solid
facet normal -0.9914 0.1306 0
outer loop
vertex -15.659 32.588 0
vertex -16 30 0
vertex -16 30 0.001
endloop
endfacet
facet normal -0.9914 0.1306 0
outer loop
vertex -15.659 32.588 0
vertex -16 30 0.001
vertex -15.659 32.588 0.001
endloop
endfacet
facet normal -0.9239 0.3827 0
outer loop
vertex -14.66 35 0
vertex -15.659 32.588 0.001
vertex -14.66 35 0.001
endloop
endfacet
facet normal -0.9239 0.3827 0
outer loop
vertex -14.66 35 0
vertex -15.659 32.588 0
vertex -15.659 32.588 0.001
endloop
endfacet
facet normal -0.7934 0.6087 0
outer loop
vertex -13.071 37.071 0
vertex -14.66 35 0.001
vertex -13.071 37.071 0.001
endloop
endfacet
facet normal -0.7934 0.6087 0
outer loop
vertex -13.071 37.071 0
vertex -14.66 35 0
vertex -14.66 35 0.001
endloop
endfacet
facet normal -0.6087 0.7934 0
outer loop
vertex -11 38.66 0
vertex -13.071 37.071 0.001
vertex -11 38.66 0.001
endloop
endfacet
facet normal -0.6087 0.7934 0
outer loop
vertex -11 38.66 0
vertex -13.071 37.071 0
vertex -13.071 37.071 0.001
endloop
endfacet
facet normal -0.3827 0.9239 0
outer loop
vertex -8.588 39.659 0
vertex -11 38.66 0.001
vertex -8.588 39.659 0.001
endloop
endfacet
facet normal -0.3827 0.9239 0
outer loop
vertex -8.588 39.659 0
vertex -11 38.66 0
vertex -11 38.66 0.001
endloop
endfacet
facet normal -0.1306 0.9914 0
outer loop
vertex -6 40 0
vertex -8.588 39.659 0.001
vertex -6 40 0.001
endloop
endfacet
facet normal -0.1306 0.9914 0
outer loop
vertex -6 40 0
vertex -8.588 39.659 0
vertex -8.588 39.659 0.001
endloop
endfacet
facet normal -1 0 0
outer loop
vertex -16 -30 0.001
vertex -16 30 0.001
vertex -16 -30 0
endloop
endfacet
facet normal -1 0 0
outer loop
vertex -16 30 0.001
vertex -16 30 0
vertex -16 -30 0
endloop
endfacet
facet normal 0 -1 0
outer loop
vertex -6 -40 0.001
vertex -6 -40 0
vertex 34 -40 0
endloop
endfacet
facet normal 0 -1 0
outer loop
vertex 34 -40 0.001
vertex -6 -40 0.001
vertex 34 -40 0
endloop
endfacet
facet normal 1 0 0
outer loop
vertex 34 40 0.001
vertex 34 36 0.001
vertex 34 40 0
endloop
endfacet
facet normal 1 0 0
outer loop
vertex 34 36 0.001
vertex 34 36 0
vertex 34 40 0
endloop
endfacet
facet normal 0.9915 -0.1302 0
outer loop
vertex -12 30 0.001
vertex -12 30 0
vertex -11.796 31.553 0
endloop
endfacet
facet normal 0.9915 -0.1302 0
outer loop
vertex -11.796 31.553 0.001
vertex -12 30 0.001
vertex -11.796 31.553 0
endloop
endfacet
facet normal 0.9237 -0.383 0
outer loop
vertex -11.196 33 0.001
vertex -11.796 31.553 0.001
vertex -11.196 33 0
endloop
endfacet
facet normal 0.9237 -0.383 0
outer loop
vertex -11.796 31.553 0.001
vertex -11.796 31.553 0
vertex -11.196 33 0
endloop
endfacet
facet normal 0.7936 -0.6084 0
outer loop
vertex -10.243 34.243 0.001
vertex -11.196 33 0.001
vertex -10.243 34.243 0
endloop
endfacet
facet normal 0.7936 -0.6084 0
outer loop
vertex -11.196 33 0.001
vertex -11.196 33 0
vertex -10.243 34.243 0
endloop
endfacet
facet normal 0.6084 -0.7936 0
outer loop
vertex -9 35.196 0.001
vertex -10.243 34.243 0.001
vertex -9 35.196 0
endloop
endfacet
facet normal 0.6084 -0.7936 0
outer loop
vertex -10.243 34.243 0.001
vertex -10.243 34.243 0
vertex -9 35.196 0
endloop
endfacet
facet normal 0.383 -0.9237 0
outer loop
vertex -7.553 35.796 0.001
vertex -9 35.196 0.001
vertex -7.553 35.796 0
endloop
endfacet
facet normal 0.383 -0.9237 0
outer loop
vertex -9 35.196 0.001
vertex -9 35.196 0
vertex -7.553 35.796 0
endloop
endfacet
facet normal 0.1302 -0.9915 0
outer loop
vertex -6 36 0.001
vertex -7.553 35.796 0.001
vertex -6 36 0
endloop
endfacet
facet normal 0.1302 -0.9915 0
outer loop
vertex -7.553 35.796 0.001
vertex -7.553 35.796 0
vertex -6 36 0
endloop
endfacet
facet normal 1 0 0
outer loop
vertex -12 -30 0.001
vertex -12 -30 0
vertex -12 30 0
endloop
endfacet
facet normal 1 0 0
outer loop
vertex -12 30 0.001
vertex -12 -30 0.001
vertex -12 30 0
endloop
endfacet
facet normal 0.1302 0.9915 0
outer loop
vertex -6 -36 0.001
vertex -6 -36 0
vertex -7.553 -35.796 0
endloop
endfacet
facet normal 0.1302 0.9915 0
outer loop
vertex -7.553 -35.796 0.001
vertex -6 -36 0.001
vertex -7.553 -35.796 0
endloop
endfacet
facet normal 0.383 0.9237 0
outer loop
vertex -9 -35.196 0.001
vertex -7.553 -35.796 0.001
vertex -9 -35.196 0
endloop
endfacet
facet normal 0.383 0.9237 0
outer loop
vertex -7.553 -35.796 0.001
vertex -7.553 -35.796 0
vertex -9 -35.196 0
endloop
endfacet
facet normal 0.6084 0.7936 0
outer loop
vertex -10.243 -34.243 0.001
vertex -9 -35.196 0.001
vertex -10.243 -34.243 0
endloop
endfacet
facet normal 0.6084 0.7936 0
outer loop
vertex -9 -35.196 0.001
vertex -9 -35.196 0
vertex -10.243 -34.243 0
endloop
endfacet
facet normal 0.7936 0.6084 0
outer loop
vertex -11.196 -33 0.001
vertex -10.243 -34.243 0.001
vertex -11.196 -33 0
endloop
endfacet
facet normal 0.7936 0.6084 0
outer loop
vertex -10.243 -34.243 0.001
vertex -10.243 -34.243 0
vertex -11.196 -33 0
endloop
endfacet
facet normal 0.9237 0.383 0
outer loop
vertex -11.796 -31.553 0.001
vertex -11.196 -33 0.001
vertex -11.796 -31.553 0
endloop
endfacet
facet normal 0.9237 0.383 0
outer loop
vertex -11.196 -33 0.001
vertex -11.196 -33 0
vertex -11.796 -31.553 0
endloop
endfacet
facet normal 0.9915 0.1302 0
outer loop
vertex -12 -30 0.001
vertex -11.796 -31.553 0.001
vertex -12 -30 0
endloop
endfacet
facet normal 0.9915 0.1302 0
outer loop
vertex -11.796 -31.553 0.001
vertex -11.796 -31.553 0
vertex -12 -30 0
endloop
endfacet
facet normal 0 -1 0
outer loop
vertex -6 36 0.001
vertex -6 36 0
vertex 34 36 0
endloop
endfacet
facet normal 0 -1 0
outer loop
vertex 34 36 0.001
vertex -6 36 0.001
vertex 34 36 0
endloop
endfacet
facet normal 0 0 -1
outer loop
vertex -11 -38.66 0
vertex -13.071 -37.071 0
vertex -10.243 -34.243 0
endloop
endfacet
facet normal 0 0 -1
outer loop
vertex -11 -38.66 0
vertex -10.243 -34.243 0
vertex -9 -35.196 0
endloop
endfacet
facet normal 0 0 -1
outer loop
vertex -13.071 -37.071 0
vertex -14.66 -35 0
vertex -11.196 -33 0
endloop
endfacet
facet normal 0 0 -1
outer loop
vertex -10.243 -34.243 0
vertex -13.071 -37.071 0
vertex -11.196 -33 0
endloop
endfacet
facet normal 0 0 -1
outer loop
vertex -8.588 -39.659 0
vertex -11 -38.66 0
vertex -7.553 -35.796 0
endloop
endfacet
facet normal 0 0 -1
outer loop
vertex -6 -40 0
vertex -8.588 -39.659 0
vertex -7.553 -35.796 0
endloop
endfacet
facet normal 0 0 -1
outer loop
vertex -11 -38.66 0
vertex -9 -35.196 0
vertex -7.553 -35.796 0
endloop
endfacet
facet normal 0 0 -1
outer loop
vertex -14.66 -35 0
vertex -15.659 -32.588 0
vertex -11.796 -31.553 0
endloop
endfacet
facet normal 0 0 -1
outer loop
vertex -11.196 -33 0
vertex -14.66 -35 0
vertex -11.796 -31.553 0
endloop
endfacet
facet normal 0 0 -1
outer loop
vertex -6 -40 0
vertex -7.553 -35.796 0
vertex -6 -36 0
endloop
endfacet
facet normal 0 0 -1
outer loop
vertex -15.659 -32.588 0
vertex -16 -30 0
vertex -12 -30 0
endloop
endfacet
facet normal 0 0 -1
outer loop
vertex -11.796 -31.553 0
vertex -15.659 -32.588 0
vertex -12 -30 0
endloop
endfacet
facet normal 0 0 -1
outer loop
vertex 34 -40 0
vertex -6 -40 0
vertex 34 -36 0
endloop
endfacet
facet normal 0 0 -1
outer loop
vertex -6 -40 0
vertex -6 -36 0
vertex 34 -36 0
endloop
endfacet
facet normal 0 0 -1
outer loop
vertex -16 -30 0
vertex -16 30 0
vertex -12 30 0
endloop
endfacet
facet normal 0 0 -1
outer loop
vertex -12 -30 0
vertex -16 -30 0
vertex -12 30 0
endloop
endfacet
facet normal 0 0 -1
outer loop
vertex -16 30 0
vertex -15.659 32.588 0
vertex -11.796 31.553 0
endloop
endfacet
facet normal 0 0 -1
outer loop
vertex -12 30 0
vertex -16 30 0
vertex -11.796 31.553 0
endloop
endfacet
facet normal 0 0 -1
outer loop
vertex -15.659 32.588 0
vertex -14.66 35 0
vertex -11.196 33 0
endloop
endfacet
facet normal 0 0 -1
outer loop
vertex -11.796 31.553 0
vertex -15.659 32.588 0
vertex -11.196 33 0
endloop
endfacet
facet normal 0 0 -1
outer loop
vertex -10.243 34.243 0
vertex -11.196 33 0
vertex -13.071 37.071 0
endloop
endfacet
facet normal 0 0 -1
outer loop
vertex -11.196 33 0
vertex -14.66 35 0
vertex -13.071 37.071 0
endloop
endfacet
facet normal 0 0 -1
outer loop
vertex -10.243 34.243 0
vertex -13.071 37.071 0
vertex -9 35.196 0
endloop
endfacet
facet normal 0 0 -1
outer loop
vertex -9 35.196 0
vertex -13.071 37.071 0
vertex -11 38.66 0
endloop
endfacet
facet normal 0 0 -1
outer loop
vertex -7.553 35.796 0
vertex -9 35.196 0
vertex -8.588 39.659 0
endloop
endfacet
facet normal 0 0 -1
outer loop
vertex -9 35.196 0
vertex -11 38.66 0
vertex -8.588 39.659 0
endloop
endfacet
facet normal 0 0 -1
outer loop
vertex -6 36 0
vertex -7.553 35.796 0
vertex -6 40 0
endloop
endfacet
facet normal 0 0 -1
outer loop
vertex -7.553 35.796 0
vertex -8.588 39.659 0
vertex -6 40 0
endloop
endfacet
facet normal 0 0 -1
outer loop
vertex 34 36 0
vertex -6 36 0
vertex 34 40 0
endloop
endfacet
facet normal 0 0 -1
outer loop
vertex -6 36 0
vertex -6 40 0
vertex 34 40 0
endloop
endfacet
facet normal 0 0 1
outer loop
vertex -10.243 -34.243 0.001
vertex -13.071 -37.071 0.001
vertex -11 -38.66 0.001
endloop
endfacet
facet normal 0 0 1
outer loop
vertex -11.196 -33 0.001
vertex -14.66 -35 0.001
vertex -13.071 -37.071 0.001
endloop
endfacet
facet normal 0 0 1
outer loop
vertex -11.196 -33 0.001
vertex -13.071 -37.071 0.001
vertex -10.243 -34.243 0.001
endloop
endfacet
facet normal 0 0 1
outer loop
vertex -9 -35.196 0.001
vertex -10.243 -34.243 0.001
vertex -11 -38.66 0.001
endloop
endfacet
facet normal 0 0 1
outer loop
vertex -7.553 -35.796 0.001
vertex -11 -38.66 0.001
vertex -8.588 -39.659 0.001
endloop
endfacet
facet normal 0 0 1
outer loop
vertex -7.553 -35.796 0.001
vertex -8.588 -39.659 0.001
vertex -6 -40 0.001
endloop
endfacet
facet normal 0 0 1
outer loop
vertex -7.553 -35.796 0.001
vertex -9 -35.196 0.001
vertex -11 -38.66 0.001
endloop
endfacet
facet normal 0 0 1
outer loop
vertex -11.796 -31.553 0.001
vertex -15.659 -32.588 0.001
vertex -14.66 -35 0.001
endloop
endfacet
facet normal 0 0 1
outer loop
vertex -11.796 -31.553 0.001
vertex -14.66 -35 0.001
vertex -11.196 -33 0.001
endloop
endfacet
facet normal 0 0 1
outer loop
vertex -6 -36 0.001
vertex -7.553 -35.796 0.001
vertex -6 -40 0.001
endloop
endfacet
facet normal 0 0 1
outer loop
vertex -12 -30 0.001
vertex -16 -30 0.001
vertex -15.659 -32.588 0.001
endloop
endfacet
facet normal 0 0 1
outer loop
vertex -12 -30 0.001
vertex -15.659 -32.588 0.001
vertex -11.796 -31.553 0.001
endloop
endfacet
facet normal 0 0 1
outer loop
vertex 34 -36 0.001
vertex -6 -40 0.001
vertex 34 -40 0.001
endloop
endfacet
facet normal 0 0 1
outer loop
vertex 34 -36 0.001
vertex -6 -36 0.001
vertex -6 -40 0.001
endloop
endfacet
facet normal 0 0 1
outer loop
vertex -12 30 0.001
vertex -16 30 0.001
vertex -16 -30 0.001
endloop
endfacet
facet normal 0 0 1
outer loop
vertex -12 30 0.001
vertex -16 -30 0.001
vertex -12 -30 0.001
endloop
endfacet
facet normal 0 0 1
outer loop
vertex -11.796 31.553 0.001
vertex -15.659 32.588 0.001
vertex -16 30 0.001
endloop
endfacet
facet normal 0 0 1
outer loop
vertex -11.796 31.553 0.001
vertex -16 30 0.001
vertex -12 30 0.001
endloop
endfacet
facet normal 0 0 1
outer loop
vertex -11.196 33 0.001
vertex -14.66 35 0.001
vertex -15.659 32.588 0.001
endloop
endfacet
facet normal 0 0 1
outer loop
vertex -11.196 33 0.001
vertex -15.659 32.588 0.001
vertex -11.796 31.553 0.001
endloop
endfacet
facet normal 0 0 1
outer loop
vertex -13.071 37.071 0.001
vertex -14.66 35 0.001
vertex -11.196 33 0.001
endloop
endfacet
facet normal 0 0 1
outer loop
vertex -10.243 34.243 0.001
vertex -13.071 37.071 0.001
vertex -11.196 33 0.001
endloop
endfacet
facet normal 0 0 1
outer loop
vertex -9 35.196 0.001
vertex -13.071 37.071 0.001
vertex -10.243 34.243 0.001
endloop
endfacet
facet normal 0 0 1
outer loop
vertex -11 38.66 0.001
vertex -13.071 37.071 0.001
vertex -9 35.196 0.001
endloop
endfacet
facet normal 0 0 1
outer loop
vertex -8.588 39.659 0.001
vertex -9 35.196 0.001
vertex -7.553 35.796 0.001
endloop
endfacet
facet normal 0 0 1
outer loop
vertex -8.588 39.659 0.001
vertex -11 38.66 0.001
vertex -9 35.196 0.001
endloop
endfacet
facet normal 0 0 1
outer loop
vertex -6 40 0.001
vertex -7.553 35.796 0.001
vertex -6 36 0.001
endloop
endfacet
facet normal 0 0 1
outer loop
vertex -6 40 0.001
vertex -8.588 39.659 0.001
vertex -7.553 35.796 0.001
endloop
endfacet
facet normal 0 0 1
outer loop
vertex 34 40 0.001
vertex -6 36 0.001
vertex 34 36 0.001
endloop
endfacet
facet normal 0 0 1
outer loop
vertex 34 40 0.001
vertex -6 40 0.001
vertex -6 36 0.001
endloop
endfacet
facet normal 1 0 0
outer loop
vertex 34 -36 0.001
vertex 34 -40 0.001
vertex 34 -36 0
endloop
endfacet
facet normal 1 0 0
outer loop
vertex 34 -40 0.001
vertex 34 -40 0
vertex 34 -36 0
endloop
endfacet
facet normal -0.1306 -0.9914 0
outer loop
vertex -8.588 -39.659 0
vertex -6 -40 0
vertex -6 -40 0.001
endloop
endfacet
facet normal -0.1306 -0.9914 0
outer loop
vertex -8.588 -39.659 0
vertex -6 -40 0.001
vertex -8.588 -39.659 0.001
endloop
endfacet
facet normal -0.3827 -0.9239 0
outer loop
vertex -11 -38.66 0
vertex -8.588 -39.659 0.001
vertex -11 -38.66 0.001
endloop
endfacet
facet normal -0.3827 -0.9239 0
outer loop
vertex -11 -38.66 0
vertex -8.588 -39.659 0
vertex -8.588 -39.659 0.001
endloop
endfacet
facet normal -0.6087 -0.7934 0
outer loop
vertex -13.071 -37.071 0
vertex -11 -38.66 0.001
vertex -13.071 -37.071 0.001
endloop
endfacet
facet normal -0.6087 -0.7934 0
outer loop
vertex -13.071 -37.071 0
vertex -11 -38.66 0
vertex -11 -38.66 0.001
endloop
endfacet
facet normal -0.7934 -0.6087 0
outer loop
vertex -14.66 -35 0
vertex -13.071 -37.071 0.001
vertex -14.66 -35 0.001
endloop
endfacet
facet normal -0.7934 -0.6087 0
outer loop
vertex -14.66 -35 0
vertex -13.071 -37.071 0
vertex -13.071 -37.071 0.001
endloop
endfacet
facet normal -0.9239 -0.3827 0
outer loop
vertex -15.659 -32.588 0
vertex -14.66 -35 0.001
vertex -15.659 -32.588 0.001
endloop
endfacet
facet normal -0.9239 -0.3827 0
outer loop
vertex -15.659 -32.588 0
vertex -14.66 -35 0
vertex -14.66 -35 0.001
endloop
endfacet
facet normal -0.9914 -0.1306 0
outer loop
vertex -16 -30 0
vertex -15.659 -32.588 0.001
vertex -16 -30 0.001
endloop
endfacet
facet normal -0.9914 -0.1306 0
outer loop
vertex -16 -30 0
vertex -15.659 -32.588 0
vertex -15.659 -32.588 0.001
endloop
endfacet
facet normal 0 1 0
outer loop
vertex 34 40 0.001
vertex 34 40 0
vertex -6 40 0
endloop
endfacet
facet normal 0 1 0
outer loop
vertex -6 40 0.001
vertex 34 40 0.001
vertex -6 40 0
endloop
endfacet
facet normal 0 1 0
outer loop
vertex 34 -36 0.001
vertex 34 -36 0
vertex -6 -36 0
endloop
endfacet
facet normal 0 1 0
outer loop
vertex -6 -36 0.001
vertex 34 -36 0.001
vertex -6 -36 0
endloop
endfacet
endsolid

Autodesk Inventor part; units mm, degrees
ref_plane "YZ Plane" through (0, 0, 0) normal (1, 0, 0) x (0, 1, 0)
ref_plane "Начальная плоскость" through (0, 0, 0) normal (0, 0, 1) x (1, 0, 0)
ref_plane "Конечная плоскость" through (0, 0, 0.001) normal (0, 0, 1) x (1, 0, 0)
sketch "Эскиз" plane through (0, 0, 0) normal (0, 0, 1) x (1, 0, 0)
  line L0 (34, 36) -> (34, 40)
  line L1 (-6, 36) -> (34, 36)
  line L2 (-12, -30) -> (-12, 30)
  line L3 (34, -36) -> (-6, -36)
  line L4 (34, -40) -> (34, -36)
  line L5 (-6, -40) -> (34, -40)
  line L6 (-16, 30) -> (-16, -30)
  line L7 (34, 40) -> (-6, 40)
  arc A0 (-16, -30) -> (-6, -40) centre (-6, -30) ccw
  arc A1 (-6, 40) -> (-16, 30) centre (-6, 30) ccw
  arc A2 (-6, 36) -> (-12, 30) centre (-6, 30) ccw
  arc A3 (-12, -30) -> (-6, -36) centre (-6, -30) ccw
  line L8 (0, 18.9497) -> (0, -18.9497) construction
  line L9 (-6.4426, 0) -> (31.4071, 0) construction
  point P0 (-12, 36)
  point P1 (-12, -36)
  point P2 (-16, -40)
  point P3 (-16, 40)
  dimension "d1" = 4
  dimension "d3" = 4
  dimension "d14" = 80
  dimension "d15" = 10
  dimension "d16" = 6
  dimension "d17" = 50
  dimension "d23" = 16
  dimension "d24" = 50
  dimension "d25" = 40
extrude "Базовый элемент" add sketch "Эскиз" along normal up to surface (0.001 mm away) from surface at 0
sketch "Sketch3" plane through (0, 0, 0) normal (0, 0, 1) x (1, 0, 0)
  line L0 (0, 0) -> (10, 0)
ref_plane "Work Plane3" through (0, 0, 0) normal (0, -1, 0) x (1, 0, 0)
sketch "Sketch4" plane through (0, 0, 0) normal (0, -1, 0) x (1, 0, 0)
  line L0 (-2, 0) -> (12, 0)
  line L1 (-2, 0.001) -> (12, 0.001)
  dimension "d29" = 0.001
equation "\"d1\" = G_T"
equation "\"d3\" = G_T"
equation "\"d14\" = G_H"
equation "\"d15\" = G_IR + G_T"
equation "\"d16\" = G_IR"
equation "\"d17\" = G_W"
equation "\"d23\" = ex"
equation "\"d24\" = G_W"
equation "\"d25\" = 0.5 * G_H"
equation "\"d10\" = G_L"
equation "\"G_H\" = 80"
equation "\"G_W\" = 50"
equation "\"G_T\" = 4"
equation "\"G_L\" = d29"
equation "\"ex\" = 16"
equation "\"G_OFFSET_START\" = 0"
equation "\"G_OFFSET_END\" = 0"
equation "\"d27\" = G_OFFSET_END + B_L"
equation "\"G_IR\" = 6"
equation "\"B_L\" = 0.001"
properties part number "Швеллер 80x50x4x6-0,001 ГОСТ 8278-83" material "Сталь, мягкая"
